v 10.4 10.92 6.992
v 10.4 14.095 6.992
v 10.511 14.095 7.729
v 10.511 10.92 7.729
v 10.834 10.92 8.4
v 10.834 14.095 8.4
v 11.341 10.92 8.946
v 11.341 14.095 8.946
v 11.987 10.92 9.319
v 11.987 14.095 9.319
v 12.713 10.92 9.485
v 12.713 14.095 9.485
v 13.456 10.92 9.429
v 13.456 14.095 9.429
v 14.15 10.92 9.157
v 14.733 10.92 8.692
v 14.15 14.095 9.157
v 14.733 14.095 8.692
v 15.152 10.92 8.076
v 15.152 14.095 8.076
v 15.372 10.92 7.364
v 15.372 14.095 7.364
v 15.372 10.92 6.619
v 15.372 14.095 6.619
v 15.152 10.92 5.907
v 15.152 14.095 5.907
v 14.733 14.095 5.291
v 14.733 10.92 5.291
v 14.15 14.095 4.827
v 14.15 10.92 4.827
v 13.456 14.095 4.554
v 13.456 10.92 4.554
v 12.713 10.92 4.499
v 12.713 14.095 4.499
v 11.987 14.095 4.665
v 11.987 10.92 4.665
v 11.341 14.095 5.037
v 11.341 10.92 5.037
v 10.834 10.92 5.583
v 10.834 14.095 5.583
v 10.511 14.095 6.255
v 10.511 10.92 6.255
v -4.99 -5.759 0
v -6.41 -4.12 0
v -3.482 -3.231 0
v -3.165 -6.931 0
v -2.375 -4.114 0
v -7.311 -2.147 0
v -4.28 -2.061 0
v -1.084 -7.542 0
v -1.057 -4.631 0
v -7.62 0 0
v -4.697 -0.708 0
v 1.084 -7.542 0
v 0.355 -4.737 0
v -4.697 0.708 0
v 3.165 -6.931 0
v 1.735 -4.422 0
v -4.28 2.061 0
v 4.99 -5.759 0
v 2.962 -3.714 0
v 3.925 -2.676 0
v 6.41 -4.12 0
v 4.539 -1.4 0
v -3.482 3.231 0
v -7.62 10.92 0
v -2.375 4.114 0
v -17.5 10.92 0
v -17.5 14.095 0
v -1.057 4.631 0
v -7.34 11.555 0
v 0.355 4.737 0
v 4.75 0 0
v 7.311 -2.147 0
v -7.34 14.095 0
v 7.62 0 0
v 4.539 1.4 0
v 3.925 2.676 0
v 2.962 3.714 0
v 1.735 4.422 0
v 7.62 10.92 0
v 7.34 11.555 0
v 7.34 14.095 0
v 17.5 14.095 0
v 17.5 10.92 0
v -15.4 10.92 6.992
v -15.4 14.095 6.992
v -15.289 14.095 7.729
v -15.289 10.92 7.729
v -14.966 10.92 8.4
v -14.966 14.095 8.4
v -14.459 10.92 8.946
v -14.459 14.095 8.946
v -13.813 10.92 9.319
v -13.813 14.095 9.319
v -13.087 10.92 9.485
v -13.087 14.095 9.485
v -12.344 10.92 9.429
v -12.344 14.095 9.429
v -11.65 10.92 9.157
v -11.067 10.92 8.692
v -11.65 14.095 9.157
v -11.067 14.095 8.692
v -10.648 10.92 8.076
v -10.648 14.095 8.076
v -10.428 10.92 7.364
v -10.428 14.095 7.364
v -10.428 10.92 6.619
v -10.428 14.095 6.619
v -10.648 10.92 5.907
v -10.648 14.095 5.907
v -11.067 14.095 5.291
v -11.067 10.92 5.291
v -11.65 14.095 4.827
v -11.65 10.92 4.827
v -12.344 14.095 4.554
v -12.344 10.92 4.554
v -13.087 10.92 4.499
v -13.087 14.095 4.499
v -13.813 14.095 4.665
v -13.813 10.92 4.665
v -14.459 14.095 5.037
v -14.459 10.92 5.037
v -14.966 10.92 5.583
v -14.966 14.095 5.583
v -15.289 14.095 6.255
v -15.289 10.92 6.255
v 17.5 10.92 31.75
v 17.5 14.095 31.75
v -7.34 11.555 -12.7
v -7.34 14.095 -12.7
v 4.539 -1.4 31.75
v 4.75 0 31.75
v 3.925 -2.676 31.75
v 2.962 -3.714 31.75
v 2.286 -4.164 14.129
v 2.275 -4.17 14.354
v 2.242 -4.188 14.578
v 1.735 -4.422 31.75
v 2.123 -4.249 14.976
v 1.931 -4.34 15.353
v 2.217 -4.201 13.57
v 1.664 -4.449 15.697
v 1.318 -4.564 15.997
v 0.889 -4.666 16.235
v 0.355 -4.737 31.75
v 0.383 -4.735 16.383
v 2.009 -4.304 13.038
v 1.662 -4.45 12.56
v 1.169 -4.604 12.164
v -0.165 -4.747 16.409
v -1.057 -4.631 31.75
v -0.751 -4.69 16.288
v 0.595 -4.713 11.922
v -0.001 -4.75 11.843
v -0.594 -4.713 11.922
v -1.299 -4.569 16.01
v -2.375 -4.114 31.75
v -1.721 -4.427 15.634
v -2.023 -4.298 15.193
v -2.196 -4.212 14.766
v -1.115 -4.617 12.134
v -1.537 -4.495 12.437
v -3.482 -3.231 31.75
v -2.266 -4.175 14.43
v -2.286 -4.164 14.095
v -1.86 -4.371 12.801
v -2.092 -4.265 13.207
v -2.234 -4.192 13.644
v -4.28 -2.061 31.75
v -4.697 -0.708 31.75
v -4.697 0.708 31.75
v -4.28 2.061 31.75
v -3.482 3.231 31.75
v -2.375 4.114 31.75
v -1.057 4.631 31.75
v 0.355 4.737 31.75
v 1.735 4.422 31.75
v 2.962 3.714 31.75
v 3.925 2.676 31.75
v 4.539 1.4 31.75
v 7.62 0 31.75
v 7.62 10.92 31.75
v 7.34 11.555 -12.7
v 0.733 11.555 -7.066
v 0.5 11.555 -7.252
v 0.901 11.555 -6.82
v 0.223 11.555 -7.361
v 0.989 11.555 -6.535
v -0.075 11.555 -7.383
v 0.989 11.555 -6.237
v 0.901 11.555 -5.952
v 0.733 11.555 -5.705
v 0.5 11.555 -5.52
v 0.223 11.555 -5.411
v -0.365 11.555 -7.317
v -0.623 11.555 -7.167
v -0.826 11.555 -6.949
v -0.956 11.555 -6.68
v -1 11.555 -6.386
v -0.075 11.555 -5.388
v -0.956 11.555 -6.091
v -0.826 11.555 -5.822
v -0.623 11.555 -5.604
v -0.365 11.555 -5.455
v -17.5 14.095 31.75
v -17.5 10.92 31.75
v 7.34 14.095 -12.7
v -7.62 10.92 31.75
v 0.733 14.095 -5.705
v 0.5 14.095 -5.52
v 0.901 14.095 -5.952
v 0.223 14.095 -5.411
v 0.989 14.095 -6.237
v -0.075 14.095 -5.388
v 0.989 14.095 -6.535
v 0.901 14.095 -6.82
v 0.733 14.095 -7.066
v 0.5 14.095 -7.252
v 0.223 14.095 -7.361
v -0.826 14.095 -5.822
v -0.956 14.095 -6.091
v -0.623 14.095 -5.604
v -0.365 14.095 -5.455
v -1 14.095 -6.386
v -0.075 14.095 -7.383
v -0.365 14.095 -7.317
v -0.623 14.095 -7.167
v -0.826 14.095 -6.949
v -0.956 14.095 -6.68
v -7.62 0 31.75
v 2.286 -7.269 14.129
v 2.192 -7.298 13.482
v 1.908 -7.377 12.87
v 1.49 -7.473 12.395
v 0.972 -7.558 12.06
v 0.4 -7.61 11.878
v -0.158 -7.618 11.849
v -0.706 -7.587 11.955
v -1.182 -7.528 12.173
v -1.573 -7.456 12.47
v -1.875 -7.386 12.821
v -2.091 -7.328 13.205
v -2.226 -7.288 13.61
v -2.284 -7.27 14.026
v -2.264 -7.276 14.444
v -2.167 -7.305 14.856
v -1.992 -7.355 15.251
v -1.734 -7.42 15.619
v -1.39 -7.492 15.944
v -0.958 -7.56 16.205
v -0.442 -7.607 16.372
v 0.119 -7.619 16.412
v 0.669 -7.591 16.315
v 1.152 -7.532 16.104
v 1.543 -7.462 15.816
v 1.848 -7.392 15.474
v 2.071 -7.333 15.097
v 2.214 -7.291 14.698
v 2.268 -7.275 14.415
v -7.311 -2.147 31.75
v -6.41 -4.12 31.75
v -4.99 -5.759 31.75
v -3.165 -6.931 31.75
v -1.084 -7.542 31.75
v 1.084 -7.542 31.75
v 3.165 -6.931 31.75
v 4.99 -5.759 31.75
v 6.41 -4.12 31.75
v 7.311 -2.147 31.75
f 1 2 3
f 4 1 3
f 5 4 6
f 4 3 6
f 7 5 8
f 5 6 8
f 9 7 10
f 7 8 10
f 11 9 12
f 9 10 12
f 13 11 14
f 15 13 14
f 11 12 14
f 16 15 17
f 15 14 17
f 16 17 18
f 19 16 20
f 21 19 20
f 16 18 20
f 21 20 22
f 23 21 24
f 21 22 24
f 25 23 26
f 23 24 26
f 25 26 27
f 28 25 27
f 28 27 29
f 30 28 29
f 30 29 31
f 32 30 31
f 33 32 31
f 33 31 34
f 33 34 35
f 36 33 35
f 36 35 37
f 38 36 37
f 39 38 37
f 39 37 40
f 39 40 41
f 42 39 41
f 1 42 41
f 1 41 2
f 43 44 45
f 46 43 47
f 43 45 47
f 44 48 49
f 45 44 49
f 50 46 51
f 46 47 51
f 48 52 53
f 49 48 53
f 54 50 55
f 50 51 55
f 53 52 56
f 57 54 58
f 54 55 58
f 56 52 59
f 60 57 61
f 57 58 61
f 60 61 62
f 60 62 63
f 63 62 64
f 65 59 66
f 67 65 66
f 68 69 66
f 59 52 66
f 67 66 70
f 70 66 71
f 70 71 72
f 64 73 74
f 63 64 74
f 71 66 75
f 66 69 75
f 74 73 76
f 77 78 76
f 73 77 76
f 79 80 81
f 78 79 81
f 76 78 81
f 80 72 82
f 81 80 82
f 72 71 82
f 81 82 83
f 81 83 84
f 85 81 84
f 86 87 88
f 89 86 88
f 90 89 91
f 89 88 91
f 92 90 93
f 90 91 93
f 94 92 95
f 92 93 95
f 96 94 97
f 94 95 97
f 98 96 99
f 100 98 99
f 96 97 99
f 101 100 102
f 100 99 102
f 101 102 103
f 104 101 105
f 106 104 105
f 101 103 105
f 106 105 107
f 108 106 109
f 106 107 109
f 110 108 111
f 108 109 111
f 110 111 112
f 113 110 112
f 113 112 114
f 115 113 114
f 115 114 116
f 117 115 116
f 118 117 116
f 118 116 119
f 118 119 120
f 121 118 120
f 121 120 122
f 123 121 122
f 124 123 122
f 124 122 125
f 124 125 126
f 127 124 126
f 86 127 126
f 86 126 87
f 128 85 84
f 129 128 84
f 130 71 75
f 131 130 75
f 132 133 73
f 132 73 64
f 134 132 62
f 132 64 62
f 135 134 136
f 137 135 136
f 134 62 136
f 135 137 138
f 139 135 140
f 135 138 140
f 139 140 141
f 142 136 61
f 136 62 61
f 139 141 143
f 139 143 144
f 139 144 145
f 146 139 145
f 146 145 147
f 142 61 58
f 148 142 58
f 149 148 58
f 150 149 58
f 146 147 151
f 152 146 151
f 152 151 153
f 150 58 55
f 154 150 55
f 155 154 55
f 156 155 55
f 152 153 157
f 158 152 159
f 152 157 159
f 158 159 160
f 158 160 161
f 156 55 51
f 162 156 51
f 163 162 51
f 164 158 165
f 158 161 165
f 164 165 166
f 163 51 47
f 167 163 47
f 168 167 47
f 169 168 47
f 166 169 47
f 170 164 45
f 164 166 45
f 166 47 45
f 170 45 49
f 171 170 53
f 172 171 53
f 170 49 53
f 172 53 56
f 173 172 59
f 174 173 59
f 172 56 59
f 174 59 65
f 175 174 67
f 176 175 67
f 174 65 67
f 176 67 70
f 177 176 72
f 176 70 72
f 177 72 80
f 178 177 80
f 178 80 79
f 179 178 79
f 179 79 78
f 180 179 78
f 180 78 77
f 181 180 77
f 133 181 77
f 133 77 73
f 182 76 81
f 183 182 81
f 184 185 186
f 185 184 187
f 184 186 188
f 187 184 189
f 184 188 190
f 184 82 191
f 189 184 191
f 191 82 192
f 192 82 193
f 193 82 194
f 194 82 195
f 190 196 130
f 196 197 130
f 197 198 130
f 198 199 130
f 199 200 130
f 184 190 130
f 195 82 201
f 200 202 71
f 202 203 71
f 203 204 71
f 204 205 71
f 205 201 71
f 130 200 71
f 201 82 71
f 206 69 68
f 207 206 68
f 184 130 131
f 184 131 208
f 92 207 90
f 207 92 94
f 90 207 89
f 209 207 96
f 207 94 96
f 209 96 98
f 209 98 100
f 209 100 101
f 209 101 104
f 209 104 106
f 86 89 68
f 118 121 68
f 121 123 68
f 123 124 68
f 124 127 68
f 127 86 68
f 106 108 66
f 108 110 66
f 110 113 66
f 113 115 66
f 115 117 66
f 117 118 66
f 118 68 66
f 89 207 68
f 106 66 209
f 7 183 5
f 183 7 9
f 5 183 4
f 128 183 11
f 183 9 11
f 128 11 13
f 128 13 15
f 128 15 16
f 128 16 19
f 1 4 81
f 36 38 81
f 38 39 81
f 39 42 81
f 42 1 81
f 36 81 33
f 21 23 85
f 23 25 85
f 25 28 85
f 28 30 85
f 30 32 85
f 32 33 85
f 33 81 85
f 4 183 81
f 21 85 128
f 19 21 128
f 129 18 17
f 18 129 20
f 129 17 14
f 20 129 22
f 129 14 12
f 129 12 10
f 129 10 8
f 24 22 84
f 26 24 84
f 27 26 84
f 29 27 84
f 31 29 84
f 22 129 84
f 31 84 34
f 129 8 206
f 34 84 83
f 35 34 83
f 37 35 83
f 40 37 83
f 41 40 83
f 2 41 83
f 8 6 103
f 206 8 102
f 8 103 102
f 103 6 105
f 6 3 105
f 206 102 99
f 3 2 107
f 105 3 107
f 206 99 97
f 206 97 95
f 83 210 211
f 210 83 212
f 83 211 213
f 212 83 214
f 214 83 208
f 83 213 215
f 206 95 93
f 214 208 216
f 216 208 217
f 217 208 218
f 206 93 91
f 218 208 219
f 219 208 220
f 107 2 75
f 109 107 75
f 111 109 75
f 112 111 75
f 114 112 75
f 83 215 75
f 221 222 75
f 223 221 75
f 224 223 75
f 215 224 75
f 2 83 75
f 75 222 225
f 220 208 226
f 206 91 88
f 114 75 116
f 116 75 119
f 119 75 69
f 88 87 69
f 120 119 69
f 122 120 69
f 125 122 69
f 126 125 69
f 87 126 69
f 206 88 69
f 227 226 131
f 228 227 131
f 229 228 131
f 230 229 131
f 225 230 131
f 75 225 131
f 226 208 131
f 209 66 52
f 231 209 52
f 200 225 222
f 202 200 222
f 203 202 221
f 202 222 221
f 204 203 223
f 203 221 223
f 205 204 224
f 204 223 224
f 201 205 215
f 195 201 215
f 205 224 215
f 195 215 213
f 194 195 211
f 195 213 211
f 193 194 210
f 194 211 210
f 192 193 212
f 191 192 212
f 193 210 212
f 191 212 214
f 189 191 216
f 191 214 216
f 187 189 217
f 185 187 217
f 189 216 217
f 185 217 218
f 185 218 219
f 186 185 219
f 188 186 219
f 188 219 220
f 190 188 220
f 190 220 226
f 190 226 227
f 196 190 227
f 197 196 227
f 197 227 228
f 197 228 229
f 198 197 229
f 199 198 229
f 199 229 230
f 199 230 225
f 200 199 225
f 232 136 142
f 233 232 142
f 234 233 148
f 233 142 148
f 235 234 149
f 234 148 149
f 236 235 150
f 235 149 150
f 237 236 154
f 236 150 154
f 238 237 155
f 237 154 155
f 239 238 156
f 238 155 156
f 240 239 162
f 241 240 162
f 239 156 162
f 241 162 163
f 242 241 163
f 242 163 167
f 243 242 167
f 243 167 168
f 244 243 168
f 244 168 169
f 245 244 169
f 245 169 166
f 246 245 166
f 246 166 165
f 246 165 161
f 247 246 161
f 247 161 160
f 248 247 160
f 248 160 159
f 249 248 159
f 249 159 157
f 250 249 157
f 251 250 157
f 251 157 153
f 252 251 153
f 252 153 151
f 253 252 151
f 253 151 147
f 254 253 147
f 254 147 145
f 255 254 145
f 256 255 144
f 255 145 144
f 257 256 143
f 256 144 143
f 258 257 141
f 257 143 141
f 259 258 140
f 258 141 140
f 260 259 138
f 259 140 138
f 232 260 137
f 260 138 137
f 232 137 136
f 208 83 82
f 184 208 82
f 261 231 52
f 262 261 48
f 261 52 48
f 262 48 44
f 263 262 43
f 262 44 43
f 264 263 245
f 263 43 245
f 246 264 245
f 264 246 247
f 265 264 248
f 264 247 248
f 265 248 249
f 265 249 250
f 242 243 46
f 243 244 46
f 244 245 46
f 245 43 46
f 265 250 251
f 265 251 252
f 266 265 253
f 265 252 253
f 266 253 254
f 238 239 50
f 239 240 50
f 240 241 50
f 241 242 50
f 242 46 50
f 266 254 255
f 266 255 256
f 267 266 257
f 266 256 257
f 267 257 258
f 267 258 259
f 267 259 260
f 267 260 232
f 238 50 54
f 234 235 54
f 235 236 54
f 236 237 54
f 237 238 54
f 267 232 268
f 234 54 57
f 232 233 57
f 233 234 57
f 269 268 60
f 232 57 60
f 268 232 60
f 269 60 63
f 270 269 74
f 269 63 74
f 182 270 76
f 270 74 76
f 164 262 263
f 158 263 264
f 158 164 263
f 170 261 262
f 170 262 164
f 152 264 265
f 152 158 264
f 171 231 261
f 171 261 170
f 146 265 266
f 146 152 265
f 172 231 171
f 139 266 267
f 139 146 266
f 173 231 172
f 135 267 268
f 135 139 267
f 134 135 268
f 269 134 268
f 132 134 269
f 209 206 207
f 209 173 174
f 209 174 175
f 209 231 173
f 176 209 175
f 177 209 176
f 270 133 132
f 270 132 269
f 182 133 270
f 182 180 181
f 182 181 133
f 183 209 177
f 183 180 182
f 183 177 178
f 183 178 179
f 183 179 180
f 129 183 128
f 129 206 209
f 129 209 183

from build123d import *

# Parameters (mm, degrees)
F1_DEPTH = 31.75
F2_R     = 4.75
F3_DEPTH = 38.1
F5_D     = 4.572
F5_DEPTH = 7.621
F7_DEPTH = 12.7
F9_D     = 2
F11_D    = 5


# Not quite as in the source:
# - a feature names something its author has since deleted; it is built from what else it names


with BuildPart() as f1:
    # F0 (on Top) → F1 (new body)
    with BuildSketch(Plane.XY):
        with BuildLine():
            Line((-7.62, 10.9198254229), (-7.62, 0))
            ThreePointArc((-7.62, 0), (0, -7.62), (7.62, 0))
            Line((7.62, 0), (7.62, 10.9198254229))
            Line((7.62, 10.9198254229), (17.5, 10.9198254229))
            Line((17.5, 10.9198254229), (17.5, 14.0948254229))
            Line((17.5, 14.0948254229), (-17.5, 14.0948254229))
            Line((-17.5, 14.0948254229), (-17.5, 10.9198254229))
            Line((-17.5, 10.9198254229), (-7.62, 10.9198254229))
        make_face()
    extrude(amount=F1_DEPTH)

    # F2 (on face) → F3 (cut)
    with BuildSketch(Plane(origin=(0, 0, 0), x_dir=(1, 0, 0), z_dir=(0, 0, -1))):
        Circle(F2_R)
    extrude(amount=-F3_DEPTH, mode=Mode.SUBTRACT)

    # F5 (through all, one way)
    with BuildSketch(Plane(origin=(0, 0, 0), x_dir=(1, 0, 0), z_dir=(0, 1, 0))):
        with Locations((0, -14.1290773165)):
            Circle(F5_D / 2)
    extrude(amount=-F5_DEPTH, mode=Mode.SUBTRACT)

    # F6 (on face) → F7 (join)
    with BuildSketch(Plane(origin=(0, 0, 0), x_dir=(1, 0, 0), z_dir=(0, 0, -1))):
        Polygon((-7.34, -11.5548254229), (-7.34, -14.0948254229), (0, -14.0948254229), (7.34, -14.0948254229), (7.34, -11.5548254229), (0, -11.5548254229), align=None)
    extrude(amount=F7_DEPTH)

    # F9 (through all)
    with Locations(Plane.XZ.offset(-11.5548254229)):
        with Locations((0, -6.3856272027)):
            Hole(F9_D / 2)

    # F11 (through all)
    with Locations(Plane.XZ.offset(-10.9198254229)):
        with Locations((-12.9, 6.9917379814), (12.9, 6.9917379814)):
            Hole(F11_D / 2)


solid = f1.part
